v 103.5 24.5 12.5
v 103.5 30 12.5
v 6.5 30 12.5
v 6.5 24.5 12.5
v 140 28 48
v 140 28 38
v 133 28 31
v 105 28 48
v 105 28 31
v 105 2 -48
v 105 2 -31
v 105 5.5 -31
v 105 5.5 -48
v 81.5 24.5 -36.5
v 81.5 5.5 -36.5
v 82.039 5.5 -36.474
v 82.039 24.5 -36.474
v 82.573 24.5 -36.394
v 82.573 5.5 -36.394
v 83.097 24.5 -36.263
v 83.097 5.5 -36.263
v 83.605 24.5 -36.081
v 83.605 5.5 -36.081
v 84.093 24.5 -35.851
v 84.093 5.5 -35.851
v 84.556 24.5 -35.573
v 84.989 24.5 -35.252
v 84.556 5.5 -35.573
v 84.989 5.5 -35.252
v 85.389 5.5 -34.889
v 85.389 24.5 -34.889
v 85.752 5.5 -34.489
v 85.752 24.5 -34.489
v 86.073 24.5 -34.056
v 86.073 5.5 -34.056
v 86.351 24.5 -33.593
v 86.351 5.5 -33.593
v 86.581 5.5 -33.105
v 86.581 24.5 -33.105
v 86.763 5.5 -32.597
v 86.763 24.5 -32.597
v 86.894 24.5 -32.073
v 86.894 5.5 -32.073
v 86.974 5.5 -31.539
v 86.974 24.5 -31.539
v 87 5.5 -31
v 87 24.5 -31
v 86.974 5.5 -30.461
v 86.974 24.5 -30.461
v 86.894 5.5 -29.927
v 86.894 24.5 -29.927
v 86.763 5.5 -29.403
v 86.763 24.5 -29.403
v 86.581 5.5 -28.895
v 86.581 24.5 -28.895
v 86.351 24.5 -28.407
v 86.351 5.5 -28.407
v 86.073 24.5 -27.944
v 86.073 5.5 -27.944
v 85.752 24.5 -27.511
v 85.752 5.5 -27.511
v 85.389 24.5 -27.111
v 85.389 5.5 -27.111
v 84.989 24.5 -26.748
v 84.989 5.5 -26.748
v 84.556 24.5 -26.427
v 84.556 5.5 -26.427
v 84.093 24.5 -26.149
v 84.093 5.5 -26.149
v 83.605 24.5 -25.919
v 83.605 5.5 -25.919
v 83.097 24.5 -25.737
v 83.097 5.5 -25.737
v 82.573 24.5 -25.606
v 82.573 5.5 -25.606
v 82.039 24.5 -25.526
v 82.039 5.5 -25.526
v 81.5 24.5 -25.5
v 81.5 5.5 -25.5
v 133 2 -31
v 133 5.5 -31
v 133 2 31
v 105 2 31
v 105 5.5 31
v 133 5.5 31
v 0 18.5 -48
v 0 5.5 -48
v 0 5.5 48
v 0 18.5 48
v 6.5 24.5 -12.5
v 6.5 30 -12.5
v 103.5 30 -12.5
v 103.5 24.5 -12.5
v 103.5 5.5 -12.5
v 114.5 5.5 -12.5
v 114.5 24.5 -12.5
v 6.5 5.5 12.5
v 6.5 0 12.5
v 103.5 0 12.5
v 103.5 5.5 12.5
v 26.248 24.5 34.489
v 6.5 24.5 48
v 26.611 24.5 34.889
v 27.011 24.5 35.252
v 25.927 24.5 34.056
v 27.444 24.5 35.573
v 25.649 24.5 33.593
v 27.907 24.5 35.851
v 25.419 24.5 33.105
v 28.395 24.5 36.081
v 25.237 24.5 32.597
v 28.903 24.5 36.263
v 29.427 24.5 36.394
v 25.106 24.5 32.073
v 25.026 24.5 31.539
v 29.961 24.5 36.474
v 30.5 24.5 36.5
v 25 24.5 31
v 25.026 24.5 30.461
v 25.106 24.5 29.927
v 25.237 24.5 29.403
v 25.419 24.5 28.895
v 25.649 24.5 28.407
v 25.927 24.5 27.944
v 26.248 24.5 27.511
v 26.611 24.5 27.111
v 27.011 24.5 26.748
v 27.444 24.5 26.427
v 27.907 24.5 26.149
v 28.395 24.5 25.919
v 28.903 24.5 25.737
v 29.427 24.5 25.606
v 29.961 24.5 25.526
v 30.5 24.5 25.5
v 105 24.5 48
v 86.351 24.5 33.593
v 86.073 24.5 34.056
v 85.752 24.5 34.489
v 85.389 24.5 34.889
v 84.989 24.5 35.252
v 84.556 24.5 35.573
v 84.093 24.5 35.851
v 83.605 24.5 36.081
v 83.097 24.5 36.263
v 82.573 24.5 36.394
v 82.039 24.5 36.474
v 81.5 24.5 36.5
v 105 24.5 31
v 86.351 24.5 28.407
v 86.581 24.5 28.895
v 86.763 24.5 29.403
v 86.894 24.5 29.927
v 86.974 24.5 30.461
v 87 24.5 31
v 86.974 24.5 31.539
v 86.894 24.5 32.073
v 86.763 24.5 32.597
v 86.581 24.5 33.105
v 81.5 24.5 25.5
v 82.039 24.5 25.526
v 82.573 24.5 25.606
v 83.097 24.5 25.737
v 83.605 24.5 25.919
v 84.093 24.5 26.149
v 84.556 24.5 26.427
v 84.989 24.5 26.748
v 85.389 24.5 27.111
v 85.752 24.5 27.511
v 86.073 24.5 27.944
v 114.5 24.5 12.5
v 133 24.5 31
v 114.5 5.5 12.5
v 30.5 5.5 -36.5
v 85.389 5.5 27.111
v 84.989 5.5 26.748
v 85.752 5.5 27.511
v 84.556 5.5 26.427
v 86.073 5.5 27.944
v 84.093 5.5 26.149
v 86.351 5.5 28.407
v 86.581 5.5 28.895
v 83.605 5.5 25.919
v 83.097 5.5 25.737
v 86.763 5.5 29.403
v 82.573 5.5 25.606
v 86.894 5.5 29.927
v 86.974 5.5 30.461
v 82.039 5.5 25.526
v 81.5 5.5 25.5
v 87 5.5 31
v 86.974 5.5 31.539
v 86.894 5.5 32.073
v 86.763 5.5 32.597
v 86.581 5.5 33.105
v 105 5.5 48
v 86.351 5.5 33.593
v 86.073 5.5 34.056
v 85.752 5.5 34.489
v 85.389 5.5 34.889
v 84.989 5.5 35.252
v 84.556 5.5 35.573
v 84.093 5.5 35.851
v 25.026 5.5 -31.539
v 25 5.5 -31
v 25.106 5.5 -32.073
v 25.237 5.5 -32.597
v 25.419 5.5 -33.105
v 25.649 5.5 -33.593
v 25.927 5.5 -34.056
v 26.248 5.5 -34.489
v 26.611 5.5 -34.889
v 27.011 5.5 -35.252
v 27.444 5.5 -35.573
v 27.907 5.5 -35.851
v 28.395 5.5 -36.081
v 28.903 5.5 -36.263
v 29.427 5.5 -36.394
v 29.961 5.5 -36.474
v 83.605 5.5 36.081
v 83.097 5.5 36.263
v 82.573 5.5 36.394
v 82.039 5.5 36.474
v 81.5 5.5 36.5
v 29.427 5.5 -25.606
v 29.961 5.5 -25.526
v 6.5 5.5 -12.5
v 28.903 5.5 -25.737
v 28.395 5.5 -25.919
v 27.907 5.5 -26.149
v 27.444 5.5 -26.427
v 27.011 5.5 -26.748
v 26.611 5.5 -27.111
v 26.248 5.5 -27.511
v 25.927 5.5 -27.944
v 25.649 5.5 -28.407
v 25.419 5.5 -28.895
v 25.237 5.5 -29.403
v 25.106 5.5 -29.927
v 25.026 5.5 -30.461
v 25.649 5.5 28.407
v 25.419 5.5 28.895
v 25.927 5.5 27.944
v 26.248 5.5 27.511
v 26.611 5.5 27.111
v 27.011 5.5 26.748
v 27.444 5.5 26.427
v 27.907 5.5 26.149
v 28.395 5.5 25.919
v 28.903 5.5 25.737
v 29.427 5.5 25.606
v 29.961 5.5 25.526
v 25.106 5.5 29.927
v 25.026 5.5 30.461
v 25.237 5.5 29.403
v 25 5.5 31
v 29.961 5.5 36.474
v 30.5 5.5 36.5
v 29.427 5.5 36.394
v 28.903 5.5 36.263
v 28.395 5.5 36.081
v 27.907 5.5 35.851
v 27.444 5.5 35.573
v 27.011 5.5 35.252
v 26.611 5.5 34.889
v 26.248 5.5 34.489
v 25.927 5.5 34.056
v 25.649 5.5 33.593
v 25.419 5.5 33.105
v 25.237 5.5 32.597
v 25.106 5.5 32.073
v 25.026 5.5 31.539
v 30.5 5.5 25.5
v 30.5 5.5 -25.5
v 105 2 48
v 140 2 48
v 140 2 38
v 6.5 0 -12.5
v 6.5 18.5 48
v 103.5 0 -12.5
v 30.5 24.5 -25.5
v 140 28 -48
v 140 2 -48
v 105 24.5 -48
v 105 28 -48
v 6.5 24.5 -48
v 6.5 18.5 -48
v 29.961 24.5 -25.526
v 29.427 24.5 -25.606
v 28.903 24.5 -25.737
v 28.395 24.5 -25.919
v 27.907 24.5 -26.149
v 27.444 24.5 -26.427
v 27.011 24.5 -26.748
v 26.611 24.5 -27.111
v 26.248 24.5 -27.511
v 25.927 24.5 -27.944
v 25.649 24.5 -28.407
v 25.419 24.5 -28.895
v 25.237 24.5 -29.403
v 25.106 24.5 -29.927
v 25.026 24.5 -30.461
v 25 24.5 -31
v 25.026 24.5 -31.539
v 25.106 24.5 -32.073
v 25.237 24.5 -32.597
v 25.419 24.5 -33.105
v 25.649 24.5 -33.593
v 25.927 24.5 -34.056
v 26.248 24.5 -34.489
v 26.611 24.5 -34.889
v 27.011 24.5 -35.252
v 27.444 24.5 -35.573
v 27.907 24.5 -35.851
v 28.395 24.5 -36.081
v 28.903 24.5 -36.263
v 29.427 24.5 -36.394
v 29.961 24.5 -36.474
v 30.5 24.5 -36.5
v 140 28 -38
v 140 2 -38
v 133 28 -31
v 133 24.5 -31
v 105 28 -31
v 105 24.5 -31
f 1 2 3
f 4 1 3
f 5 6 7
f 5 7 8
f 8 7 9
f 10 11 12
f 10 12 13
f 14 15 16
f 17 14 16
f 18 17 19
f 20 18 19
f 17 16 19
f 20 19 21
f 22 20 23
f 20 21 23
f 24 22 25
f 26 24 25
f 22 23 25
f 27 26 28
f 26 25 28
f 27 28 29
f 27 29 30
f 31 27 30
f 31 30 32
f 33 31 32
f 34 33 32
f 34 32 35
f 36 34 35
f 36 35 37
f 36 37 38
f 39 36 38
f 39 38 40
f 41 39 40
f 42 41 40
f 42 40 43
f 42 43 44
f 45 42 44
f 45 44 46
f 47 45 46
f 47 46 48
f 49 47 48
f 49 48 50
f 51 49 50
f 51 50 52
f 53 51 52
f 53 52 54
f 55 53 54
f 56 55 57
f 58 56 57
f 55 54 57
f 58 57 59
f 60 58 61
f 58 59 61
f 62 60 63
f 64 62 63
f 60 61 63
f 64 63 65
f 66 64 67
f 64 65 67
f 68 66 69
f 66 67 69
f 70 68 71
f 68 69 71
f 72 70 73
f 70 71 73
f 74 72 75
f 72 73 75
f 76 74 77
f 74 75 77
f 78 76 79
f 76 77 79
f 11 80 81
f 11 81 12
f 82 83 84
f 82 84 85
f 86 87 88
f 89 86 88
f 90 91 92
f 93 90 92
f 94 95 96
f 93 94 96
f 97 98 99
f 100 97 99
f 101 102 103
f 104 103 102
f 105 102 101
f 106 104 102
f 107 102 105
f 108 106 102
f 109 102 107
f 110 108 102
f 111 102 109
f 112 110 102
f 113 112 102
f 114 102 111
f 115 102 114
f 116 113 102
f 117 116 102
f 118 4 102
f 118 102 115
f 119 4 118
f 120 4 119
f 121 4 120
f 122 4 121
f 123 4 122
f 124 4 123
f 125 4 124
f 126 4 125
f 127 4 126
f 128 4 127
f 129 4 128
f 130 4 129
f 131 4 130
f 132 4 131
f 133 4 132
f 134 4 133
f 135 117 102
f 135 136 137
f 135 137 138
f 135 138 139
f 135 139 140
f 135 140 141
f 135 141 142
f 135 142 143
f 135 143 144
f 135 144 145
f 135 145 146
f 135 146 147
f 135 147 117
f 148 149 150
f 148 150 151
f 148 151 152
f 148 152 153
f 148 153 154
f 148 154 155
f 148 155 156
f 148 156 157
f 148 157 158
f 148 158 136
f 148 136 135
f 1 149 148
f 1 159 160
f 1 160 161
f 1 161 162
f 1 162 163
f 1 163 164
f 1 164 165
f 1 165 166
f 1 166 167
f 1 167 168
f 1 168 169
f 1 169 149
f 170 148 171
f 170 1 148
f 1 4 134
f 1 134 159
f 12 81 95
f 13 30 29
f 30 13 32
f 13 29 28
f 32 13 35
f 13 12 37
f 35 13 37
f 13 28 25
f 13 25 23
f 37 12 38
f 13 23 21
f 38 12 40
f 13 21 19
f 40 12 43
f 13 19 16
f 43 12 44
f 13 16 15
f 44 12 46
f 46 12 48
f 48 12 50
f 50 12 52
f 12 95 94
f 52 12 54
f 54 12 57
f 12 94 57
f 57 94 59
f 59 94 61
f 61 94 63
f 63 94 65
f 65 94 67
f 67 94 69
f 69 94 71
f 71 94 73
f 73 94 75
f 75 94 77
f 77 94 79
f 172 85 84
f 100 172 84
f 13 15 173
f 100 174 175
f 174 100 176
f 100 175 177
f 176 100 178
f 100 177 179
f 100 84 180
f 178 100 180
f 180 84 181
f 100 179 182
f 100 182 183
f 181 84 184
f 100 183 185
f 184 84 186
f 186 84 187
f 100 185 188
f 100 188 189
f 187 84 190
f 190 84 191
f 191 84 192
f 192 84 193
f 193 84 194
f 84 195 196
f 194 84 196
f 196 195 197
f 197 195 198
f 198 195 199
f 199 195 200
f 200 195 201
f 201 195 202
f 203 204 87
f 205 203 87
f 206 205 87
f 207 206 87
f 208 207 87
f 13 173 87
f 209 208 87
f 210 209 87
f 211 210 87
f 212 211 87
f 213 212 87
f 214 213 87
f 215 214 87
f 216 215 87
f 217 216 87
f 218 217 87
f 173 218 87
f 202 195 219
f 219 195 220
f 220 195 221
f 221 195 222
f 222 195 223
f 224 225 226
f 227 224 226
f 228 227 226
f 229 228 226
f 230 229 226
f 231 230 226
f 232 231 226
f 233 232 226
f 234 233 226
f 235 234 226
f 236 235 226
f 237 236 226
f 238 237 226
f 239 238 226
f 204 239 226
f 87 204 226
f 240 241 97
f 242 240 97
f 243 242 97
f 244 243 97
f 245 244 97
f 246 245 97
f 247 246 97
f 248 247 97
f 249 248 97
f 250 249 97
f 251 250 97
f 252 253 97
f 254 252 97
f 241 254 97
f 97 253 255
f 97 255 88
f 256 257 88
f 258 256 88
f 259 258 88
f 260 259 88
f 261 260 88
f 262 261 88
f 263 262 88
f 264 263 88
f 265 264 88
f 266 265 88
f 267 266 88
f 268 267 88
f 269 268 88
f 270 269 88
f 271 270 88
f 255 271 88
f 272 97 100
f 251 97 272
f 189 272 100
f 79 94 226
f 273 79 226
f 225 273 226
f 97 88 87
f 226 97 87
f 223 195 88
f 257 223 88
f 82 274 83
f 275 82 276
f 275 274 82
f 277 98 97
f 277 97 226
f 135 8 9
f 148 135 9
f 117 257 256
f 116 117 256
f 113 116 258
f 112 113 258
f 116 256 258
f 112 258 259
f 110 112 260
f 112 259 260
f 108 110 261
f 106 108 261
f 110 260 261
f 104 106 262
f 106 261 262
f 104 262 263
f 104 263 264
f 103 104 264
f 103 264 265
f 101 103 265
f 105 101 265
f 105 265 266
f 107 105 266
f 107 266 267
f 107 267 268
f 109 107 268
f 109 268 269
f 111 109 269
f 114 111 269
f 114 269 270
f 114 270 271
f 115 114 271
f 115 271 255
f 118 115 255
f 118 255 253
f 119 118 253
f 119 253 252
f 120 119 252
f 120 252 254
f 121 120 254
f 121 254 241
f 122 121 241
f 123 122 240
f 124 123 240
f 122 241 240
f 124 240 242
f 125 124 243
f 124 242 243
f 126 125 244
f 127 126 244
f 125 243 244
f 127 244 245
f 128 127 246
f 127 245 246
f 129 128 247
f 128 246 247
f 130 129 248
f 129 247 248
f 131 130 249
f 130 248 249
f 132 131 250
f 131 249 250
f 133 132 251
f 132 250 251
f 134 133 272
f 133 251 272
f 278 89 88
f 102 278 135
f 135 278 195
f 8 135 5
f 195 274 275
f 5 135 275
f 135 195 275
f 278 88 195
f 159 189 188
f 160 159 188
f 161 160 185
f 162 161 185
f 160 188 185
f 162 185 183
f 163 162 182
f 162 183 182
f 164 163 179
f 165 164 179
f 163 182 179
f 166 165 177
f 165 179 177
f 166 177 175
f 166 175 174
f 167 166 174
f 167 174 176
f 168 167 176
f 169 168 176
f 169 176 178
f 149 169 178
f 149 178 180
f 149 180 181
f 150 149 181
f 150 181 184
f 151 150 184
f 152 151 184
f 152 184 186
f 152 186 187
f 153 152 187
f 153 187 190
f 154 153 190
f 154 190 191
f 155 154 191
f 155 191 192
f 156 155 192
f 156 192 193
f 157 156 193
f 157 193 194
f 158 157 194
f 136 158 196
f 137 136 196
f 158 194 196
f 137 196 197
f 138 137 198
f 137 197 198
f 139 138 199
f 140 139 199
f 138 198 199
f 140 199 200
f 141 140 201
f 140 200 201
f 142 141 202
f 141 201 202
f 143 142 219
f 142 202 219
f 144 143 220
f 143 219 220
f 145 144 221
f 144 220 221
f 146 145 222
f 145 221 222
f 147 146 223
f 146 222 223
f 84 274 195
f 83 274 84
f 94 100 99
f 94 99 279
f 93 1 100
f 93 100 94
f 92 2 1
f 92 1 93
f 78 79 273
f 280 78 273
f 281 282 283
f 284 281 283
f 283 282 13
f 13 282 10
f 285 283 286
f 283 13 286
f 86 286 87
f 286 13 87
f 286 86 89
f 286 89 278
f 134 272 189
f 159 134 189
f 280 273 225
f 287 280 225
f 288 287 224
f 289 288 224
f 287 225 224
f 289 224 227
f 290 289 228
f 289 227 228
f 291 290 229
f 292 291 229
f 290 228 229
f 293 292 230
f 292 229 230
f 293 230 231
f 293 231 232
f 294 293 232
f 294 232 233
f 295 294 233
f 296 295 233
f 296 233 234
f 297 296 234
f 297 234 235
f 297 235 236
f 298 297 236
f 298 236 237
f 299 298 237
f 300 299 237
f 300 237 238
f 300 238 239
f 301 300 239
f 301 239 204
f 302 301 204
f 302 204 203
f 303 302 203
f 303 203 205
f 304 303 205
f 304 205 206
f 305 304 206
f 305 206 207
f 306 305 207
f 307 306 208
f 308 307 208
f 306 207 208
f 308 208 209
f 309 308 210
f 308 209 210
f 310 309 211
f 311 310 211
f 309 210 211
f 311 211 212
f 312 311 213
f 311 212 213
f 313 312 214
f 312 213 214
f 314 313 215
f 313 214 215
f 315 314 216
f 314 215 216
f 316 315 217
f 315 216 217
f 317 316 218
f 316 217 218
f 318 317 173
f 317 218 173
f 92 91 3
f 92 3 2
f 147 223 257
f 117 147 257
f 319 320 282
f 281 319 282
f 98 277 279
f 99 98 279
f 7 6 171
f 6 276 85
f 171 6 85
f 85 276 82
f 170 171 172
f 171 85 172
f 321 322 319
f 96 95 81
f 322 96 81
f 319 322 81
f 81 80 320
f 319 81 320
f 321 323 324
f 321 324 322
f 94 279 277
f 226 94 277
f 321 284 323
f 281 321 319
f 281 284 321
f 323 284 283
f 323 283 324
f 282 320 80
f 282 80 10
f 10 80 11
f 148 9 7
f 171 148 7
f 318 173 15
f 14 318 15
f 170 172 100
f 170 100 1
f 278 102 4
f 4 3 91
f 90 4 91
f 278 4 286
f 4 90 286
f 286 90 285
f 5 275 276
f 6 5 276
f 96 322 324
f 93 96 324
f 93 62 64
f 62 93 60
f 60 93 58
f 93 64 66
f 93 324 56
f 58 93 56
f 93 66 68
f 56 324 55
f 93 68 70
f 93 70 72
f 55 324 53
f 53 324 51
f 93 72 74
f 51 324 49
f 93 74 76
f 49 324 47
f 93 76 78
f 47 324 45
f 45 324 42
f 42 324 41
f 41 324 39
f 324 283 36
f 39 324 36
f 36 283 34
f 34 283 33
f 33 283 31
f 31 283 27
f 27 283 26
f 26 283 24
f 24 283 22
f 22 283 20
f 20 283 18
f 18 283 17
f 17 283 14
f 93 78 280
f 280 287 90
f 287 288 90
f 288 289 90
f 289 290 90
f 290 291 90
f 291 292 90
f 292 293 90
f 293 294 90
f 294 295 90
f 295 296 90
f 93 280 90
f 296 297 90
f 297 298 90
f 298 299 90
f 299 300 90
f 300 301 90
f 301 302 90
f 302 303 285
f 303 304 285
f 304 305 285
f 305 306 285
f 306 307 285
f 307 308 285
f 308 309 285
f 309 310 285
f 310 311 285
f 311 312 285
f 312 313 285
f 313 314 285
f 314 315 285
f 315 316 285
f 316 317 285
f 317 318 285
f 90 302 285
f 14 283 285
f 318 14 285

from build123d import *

# Parameters (mm, degrees)
BOSS_EXTRUDE1_DEPTH = 30
CUT_EXTRUDE1_DEPTH  = 2
CUT_EXTRUDE2_DEPTH  = 2
SKETCH5_W           = 6.5
SKETCH5_H           = 96
CUT_EXTRUDE3_DEPTH  = 11.5
CUT_EXTRUDE4_DEPTH  = 5.5
CUT_EXTRUDE5_DEPTH  = 5.5
SKETCH8_W           = 25
SKETCH8_H           = 30
CUT_EXTRUDE6_DEPTH  = 1
SKETCH9_W           = 25
SKETCH9_H           = 30
CUT_EXTRUDE7_DEPTH  = 0.5


with BuildPart() as part:
    # Sketch2 → Boss-Extrude1 (new body)
    # profile 1 of 3: a face of its own
    with BuildSketch(Plane(origin=(0, 0, 0), x_dir=(1, 0, 0), z_dir=(0, 1, 0))):
        Polygon((114.5, 12.5), (133, 31), (98, 31), (98, 48), (0, 48), (0, -48), (98, -48), (98, -31), (133, -31), (114.5, -12.5), (105, -12.5), (105, 12.5), align=None)
        with BuildLine():
            Line((81.5, -36.5), (30.5, -36.5))
            ThreePointArc((30.5, -36.5), (25, -31), (30.5, -25.5))
            Line((30.5, -25.5), (81.5, -25.5))
            ThreePointArc((81.5, -25.5), (87, -31), (81.5, -36.5))
        make_face(mode=Mode.SUBTRACT)
        with BuildLine():
            ThreePointArc((30.5, 25.5), (25, 31), (30.5, 36.5))
            Line((30.5, 36.5), (81.5, 36.5))
            ThreePointArc((81.5, 36.5), (87, 31), (81.5, 25.5))
            Line((81.5, 25.5), (30.5, 25.5))
        make_face(mode=Mode.SUBTRACT)
    # profile 2 of 3: a face of its own
    with BuildSketch(Plane(origin=(0, 0, 0), x_dir=(1, 0, 0), z_dir=(0, 1, 0))):
        Polygon((133, 31), (140, 38), (140, 48), (98, 48), (98, 31), align=None)
    # profile 3 of 3: a face of its own
    with BuildSketch(Plane(origin=(0, 0, 0), x_dir=(1, 0, 0), z_dir=(0, 1, 0))):
        Polygon((98, -31), (98, -48), (140, -48), (140, -38), (133, -31), align=None)
    extrude(amount=BOSS_EXTRUDE1_DEPTH)

    # Sketch3 → Cut-Extrude1 (cut)
    with BuildSketch(Plane(origin=(0, 30, 0), x_dir=(1, 0, 0), z_dir=(0, 1, 0))):
        Polygon((105, 48), (105, 31), (133, 31), (140, 38), (140, 48), align=None)
        Polygon((140, -38), (140, -48), (105, -48), (105, -31), (133, -31), align=None)
    extrude(amount=-CUT_EXTRUDE1_DEPTH, mode=Mode.SUBTRACT)

    # Sketch4 → Cut-Extrude2 (cut)
    with BuildSketch(Plane.XZ):
        Polygon((105, 48), (105, 31), (133, 31), (140, 38), (140, 48), align=None)
        Polygon((105, -48), (105, -31), (133, -31), (140, -38), (140, -48), align=None)
    extrude(amount=-CUT_EXTRUDE2_DEPTH, mode=Mode.SUBTRACT)

    # Sketch5 → Cut-Extrude3 (cut)
    with BuildSketch(Plane(origin=(0, 30, 0), x_dir=(1, 0, 0), z_dir=(0, 1, 0))):
        with Locations((3.25, 0)):
            Rectangle(SKETCH5_W, SKETCH5_H)
    extrude(amount=-CUT_EXTRUDE3_DEPTH, mode=Mode.SUBTRACT)

    # Sketch6 → Cut-Extrude4 (cut)
    with BuildSketch(Plane(origin=(0, 30, 0), x_dir=(1, 0, 0), z_dir=(0, 1, 0))):
        Polygon((105, 12.5), (6.5, 12.5), (6.5, 48), (105, 48), (105, 31), (133, 31), (114.5, 12.5), align=None)
        Polygon((105, -12.5), (6.5, -12.5), (6.5, -48), (105, -48), (105, -31), (133, -31), (114.5, -12.5), align=None)
    extrude(amount=-CUT_EXTRUDE4_DEPTH, mode=Mode.SUBTRACT)

    # Sketch7 → Cut-Extrude5 (cut)
    with BuildSketch(Plane.XZ):
        Polygon((105, 12.5), (6.5, 12.5), (6.5, -12.5), (105, -12.5), (114.5, -12.5), (133, -31), (105, -31), (105, -48), (0, -48), (0, 48), (105, 48), (105, 31), (133, 31), (114.5, 12.5), align=None)
    extrude(amount=-CUT_EXTRUDE5_DEPTH, mode=Mode.SUBTRACT)

    # Sketch8 → Cut-Extrude6 (cut)
    with BuildSketch(Plane(origin=(105, 0, 0), x_dir=(0, 0, -1), z_dir=(1, 0, 0))):
        with Locations((0, 15)):
            Rectangle(SKETCH8_W, SKETCH8_H)
    extrude(amount=-CUT_EXTRUDE6_DEPTH, mode=Mode.SUBTRACT)

    # Sketch9 → Cut-Extrude7 (cut)
    with BuildSketch(Plane(origin=(104, 0, 0), x_dir=(0, 0, -1), z_dir=(1, 0, 0))):
        with Locations((0, 15)):
            Rectangle(SKETCH9_W, SKETCH9_H)
    extrude(amount=-CUT_EXTRUDE7_DEPTH, mode=Mode.SUBTRACT)


solid = part.part
